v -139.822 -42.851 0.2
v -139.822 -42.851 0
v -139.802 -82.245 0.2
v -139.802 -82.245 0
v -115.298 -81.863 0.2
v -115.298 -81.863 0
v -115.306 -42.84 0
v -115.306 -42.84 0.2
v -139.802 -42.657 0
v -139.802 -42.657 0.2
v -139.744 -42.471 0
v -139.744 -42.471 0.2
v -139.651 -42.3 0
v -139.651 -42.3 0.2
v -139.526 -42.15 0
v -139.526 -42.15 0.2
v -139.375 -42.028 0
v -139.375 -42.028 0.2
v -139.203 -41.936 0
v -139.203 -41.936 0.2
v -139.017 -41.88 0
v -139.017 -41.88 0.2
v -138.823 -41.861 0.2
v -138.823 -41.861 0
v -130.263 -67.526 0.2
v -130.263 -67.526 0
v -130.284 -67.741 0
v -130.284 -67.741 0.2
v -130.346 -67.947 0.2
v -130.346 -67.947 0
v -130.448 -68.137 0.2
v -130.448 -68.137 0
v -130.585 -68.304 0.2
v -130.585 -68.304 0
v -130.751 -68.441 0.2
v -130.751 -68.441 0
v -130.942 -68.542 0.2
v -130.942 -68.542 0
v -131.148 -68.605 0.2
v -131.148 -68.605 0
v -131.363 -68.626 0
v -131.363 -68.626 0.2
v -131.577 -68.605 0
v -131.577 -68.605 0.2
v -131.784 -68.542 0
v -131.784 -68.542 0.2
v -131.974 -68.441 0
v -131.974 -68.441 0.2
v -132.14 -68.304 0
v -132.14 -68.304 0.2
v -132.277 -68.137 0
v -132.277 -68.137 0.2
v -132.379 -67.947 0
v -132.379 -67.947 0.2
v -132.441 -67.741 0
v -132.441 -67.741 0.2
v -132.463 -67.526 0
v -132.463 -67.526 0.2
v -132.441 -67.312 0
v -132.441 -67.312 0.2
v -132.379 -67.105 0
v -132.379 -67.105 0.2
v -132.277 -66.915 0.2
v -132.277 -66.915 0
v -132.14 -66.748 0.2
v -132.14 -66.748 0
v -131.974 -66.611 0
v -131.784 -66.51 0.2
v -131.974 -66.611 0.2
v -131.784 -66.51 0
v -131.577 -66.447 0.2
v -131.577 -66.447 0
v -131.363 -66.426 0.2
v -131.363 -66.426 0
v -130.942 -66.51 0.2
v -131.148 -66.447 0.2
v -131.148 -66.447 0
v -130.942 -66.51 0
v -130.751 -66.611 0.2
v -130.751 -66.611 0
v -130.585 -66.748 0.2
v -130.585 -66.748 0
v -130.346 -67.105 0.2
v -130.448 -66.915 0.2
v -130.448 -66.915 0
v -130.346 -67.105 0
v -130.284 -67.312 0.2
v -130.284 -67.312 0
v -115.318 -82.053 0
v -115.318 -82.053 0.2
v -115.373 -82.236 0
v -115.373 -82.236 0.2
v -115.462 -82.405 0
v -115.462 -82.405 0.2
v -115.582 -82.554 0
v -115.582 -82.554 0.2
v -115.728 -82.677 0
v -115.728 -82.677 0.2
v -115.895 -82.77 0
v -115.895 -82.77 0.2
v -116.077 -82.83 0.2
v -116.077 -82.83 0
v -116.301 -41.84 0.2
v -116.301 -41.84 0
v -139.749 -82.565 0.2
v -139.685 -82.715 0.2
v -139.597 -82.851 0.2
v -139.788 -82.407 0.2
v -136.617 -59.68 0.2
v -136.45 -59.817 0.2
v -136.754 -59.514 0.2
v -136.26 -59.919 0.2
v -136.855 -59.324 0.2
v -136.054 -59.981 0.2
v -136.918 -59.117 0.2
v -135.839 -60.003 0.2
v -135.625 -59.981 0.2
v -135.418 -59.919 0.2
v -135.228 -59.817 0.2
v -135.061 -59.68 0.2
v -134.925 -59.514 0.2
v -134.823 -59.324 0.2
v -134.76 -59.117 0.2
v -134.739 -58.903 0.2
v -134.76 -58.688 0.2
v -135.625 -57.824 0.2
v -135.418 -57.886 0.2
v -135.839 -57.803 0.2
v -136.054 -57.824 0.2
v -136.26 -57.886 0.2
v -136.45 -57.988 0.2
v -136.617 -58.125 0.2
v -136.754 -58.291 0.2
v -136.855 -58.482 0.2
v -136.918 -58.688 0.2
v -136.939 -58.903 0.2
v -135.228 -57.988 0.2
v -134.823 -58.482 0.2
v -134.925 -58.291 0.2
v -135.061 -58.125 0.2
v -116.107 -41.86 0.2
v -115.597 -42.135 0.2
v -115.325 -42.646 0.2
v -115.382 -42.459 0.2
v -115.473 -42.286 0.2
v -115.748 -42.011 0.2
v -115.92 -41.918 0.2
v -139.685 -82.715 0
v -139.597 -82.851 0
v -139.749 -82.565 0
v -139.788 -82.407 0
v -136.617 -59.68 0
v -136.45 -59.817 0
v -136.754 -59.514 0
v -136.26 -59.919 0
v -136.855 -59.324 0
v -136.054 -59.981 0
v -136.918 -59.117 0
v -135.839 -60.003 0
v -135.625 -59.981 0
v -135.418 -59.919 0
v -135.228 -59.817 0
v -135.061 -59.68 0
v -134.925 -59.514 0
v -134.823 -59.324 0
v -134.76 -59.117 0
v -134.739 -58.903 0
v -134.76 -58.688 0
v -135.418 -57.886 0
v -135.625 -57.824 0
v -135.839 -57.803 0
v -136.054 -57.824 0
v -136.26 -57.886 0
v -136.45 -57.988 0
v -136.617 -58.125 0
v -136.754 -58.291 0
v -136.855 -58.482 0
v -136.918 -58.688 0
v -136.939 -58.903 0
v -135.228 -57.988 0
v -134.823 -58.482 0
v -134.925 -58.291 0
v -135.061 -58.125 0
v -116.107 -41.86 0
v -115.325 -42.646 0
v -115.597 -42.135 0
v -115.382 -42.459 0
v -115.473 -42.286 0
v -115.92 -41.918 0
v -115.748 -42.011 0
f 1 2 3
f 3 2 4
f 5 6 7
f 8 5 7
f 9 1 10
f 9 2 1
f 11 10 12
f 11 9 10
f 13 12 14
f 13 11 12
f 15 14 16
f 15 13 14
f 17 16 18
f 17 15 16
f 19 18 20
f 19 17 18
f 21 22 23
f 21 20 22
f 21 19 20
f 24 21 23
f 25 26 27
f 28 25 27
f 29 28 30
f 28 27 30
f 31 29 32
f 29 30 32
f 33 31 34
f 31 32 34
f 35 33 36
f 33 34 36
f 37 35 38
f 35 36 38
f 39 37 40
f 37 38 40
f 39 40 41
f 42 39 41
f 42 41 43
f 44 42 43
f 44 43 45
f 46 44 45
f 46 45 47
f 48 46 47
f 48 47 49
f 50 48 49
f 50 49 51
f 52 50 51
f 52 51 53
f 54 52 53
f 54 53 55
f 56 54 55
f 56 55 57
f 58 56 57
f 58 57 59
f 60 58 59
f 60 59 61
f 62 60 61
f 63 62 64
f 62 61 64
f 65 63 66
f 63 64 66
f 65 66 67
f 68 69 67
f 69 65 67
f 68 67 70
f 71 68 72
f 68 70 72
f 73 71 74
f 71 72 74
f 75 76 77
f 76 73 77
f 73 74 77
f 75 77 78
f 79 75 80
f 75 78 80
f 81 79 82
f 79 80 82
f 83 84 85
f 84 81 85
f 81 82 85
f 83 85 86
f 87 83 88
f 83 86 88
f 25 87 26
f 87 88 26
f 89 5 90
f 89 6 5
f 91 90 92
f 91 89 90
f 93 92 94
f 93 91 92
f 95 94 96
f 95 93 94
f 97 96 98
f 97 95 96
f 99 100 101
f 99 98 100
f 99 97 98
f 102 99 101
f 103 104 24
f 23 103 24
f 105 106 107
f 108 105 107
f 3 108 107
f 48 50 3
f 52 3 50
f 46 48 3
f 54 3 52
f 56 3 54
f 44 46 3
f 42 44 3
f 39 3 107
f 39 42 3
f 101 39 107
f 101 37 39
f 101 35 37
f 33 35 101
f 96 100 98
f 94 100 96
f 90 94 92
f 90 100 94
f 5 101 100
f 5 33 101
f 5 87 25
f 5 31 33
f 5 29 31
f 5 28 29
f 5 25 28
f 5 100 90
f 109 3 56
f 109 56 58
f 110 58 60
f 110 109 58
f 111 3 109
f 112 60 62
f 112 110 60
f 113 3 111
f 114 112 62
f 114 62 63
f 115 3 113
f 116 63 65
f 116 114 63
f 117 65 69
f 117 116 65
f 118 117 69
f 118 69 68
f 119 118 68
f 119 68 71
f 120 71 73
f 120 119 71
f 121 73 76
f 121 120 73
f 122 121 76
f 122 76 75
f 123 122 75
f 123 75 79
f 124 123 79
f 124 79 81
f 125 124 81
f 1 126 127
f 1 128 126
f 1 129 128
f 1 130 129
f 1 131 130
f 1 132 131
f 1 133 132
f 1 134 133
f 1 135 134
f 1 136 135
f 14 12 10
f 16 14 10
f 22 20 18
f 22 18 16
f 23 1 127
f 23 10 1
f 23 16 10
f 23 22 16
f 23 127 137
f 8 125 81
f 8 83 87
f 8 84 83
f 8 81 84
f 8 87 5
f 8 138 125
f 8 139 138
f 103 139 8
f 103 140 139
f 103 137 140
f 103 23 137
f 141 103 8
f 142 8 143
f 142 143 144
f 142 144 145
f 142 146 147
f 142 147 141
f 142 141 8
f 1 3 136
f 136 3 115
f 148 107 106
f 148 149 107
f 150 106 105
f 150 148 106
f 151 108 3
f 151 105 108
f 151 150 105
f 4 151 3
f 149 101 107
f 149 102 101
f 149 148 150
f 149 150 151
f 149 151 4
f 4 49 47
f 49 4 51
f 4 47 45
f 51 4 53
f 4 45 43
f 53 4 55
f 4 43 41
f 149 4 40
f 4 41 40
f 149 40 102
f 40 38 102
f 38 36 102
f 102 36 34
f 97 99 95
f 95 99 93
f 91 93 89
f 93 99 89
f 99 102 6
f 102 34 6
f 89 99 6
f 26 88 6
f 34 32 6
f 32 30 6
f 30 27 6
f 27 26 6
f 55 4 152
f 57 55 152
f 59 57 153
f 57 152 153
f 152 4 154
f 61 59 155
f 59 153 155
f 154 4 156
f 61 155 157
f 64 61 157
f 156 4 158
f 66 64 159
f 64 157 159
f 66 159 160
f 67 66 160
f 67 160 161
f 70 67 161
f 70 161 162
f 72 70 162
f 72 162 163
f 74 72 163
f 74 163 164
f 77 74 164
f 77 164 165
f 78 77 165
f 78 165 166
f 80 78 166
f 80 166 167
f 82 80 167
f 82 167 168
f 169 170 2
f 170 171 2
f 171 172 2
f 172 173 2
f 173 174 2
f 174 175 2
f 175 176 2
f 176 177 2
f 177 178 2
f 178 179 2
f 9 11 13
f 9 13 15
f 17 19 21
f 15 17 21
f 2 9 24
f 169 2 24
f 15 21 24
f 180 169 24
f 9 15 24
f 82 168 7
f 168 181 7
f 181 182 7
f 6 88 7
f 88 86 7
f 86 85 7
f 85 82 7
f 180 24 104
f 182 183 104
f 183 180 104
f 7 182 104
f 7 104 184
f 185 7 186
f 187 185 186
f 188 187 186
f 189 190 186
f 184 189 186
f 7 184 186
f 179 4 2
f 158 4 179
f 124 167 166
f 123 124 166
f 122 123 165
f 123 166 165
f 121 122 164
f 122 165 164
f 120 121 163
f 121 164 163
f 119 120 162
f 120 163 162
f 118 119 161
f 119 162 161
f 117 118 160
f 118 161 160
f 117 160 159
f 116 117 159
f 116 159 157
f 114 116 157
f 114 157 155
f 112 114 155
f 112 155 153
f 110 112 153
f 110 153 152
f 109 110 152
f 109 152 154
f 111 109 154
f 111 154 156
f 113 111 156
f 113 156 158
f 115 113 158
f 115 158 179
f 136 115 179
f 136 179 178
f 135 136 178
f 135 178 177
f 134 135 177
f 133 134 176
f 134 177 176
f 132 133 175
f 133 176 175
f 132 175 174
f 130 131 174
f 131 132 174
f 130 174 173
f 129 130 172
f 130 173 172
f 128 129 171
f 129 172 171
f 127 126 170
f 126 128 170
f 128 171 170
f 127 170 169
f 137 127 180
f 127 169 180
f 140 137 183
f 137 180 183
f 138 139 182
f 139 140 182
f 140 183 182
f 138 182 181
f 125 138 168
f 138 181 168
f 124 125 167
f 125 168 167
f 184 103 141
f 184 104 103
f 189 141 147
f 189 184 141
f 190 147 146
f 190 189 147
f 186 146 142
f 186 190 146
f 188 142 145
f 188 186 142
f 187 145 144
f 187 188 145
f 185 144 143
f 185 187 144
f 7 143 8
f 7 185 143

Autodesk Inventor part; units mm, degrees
ref_plane "YZ Plane" through (0, 0, 0) normal (1, 0, 0) x (0, 1, 0)
ref_plane "XZ Plane" through (0, 0, 0) normal (0, 1, 0) x (-1, 0, 0)
ref_plane "XY Plane" through (0, 0, 0) normal (0, 0, 1) x (1, 0, 0)
sketch "Sketch1" plane through (0, 0, 0) normal (0, 0, 1) x (1, 0, 0)
  line L0 (-139.8225, -42.851) -> (-139.8018, -82.2454) projected
  arc A0 (-138.8232, -41.8607) -> (-139.8225, -42.851) centre (-138.8223, -42.8609) ccw projected
  line L1 (-116.3009, -41.8403) -> (-138.8232, -41.8607) projected
  arc A1 (-115.3058, -42.8403) -> (-116.3009, -41.8403) centre (-116.306, -42.8405) ccw projected
  line L2 (-115.2978, -81.8628) -> (-115.3058, -42.8403) projected
  arc A2 (-116.299, -82.8549) -> (-115.2978, -81.8628) centre (-116.2978, -81.8549) ccw projected
  arc A3 (-139.8018, -82.2454) -> (-139.3074, -83.1072) centre (-138.8025, -82.2449) ccw projected
  line L3 (-116.0766, -82.8302) -> (-139.5966, -82.8514)
  circle A4 centre (-131.3626, -67.5261) radius 1.1 projected
  circle A5 centre (-135.8392, -58.9026) radius 1.1 projected
  point P0 (0, 0)
  dimension "d0" = 40.99
extrude "Extrusion1" add sketch "Sketch1" along normal blind 0.2
properties part number "Side Stiffener"
